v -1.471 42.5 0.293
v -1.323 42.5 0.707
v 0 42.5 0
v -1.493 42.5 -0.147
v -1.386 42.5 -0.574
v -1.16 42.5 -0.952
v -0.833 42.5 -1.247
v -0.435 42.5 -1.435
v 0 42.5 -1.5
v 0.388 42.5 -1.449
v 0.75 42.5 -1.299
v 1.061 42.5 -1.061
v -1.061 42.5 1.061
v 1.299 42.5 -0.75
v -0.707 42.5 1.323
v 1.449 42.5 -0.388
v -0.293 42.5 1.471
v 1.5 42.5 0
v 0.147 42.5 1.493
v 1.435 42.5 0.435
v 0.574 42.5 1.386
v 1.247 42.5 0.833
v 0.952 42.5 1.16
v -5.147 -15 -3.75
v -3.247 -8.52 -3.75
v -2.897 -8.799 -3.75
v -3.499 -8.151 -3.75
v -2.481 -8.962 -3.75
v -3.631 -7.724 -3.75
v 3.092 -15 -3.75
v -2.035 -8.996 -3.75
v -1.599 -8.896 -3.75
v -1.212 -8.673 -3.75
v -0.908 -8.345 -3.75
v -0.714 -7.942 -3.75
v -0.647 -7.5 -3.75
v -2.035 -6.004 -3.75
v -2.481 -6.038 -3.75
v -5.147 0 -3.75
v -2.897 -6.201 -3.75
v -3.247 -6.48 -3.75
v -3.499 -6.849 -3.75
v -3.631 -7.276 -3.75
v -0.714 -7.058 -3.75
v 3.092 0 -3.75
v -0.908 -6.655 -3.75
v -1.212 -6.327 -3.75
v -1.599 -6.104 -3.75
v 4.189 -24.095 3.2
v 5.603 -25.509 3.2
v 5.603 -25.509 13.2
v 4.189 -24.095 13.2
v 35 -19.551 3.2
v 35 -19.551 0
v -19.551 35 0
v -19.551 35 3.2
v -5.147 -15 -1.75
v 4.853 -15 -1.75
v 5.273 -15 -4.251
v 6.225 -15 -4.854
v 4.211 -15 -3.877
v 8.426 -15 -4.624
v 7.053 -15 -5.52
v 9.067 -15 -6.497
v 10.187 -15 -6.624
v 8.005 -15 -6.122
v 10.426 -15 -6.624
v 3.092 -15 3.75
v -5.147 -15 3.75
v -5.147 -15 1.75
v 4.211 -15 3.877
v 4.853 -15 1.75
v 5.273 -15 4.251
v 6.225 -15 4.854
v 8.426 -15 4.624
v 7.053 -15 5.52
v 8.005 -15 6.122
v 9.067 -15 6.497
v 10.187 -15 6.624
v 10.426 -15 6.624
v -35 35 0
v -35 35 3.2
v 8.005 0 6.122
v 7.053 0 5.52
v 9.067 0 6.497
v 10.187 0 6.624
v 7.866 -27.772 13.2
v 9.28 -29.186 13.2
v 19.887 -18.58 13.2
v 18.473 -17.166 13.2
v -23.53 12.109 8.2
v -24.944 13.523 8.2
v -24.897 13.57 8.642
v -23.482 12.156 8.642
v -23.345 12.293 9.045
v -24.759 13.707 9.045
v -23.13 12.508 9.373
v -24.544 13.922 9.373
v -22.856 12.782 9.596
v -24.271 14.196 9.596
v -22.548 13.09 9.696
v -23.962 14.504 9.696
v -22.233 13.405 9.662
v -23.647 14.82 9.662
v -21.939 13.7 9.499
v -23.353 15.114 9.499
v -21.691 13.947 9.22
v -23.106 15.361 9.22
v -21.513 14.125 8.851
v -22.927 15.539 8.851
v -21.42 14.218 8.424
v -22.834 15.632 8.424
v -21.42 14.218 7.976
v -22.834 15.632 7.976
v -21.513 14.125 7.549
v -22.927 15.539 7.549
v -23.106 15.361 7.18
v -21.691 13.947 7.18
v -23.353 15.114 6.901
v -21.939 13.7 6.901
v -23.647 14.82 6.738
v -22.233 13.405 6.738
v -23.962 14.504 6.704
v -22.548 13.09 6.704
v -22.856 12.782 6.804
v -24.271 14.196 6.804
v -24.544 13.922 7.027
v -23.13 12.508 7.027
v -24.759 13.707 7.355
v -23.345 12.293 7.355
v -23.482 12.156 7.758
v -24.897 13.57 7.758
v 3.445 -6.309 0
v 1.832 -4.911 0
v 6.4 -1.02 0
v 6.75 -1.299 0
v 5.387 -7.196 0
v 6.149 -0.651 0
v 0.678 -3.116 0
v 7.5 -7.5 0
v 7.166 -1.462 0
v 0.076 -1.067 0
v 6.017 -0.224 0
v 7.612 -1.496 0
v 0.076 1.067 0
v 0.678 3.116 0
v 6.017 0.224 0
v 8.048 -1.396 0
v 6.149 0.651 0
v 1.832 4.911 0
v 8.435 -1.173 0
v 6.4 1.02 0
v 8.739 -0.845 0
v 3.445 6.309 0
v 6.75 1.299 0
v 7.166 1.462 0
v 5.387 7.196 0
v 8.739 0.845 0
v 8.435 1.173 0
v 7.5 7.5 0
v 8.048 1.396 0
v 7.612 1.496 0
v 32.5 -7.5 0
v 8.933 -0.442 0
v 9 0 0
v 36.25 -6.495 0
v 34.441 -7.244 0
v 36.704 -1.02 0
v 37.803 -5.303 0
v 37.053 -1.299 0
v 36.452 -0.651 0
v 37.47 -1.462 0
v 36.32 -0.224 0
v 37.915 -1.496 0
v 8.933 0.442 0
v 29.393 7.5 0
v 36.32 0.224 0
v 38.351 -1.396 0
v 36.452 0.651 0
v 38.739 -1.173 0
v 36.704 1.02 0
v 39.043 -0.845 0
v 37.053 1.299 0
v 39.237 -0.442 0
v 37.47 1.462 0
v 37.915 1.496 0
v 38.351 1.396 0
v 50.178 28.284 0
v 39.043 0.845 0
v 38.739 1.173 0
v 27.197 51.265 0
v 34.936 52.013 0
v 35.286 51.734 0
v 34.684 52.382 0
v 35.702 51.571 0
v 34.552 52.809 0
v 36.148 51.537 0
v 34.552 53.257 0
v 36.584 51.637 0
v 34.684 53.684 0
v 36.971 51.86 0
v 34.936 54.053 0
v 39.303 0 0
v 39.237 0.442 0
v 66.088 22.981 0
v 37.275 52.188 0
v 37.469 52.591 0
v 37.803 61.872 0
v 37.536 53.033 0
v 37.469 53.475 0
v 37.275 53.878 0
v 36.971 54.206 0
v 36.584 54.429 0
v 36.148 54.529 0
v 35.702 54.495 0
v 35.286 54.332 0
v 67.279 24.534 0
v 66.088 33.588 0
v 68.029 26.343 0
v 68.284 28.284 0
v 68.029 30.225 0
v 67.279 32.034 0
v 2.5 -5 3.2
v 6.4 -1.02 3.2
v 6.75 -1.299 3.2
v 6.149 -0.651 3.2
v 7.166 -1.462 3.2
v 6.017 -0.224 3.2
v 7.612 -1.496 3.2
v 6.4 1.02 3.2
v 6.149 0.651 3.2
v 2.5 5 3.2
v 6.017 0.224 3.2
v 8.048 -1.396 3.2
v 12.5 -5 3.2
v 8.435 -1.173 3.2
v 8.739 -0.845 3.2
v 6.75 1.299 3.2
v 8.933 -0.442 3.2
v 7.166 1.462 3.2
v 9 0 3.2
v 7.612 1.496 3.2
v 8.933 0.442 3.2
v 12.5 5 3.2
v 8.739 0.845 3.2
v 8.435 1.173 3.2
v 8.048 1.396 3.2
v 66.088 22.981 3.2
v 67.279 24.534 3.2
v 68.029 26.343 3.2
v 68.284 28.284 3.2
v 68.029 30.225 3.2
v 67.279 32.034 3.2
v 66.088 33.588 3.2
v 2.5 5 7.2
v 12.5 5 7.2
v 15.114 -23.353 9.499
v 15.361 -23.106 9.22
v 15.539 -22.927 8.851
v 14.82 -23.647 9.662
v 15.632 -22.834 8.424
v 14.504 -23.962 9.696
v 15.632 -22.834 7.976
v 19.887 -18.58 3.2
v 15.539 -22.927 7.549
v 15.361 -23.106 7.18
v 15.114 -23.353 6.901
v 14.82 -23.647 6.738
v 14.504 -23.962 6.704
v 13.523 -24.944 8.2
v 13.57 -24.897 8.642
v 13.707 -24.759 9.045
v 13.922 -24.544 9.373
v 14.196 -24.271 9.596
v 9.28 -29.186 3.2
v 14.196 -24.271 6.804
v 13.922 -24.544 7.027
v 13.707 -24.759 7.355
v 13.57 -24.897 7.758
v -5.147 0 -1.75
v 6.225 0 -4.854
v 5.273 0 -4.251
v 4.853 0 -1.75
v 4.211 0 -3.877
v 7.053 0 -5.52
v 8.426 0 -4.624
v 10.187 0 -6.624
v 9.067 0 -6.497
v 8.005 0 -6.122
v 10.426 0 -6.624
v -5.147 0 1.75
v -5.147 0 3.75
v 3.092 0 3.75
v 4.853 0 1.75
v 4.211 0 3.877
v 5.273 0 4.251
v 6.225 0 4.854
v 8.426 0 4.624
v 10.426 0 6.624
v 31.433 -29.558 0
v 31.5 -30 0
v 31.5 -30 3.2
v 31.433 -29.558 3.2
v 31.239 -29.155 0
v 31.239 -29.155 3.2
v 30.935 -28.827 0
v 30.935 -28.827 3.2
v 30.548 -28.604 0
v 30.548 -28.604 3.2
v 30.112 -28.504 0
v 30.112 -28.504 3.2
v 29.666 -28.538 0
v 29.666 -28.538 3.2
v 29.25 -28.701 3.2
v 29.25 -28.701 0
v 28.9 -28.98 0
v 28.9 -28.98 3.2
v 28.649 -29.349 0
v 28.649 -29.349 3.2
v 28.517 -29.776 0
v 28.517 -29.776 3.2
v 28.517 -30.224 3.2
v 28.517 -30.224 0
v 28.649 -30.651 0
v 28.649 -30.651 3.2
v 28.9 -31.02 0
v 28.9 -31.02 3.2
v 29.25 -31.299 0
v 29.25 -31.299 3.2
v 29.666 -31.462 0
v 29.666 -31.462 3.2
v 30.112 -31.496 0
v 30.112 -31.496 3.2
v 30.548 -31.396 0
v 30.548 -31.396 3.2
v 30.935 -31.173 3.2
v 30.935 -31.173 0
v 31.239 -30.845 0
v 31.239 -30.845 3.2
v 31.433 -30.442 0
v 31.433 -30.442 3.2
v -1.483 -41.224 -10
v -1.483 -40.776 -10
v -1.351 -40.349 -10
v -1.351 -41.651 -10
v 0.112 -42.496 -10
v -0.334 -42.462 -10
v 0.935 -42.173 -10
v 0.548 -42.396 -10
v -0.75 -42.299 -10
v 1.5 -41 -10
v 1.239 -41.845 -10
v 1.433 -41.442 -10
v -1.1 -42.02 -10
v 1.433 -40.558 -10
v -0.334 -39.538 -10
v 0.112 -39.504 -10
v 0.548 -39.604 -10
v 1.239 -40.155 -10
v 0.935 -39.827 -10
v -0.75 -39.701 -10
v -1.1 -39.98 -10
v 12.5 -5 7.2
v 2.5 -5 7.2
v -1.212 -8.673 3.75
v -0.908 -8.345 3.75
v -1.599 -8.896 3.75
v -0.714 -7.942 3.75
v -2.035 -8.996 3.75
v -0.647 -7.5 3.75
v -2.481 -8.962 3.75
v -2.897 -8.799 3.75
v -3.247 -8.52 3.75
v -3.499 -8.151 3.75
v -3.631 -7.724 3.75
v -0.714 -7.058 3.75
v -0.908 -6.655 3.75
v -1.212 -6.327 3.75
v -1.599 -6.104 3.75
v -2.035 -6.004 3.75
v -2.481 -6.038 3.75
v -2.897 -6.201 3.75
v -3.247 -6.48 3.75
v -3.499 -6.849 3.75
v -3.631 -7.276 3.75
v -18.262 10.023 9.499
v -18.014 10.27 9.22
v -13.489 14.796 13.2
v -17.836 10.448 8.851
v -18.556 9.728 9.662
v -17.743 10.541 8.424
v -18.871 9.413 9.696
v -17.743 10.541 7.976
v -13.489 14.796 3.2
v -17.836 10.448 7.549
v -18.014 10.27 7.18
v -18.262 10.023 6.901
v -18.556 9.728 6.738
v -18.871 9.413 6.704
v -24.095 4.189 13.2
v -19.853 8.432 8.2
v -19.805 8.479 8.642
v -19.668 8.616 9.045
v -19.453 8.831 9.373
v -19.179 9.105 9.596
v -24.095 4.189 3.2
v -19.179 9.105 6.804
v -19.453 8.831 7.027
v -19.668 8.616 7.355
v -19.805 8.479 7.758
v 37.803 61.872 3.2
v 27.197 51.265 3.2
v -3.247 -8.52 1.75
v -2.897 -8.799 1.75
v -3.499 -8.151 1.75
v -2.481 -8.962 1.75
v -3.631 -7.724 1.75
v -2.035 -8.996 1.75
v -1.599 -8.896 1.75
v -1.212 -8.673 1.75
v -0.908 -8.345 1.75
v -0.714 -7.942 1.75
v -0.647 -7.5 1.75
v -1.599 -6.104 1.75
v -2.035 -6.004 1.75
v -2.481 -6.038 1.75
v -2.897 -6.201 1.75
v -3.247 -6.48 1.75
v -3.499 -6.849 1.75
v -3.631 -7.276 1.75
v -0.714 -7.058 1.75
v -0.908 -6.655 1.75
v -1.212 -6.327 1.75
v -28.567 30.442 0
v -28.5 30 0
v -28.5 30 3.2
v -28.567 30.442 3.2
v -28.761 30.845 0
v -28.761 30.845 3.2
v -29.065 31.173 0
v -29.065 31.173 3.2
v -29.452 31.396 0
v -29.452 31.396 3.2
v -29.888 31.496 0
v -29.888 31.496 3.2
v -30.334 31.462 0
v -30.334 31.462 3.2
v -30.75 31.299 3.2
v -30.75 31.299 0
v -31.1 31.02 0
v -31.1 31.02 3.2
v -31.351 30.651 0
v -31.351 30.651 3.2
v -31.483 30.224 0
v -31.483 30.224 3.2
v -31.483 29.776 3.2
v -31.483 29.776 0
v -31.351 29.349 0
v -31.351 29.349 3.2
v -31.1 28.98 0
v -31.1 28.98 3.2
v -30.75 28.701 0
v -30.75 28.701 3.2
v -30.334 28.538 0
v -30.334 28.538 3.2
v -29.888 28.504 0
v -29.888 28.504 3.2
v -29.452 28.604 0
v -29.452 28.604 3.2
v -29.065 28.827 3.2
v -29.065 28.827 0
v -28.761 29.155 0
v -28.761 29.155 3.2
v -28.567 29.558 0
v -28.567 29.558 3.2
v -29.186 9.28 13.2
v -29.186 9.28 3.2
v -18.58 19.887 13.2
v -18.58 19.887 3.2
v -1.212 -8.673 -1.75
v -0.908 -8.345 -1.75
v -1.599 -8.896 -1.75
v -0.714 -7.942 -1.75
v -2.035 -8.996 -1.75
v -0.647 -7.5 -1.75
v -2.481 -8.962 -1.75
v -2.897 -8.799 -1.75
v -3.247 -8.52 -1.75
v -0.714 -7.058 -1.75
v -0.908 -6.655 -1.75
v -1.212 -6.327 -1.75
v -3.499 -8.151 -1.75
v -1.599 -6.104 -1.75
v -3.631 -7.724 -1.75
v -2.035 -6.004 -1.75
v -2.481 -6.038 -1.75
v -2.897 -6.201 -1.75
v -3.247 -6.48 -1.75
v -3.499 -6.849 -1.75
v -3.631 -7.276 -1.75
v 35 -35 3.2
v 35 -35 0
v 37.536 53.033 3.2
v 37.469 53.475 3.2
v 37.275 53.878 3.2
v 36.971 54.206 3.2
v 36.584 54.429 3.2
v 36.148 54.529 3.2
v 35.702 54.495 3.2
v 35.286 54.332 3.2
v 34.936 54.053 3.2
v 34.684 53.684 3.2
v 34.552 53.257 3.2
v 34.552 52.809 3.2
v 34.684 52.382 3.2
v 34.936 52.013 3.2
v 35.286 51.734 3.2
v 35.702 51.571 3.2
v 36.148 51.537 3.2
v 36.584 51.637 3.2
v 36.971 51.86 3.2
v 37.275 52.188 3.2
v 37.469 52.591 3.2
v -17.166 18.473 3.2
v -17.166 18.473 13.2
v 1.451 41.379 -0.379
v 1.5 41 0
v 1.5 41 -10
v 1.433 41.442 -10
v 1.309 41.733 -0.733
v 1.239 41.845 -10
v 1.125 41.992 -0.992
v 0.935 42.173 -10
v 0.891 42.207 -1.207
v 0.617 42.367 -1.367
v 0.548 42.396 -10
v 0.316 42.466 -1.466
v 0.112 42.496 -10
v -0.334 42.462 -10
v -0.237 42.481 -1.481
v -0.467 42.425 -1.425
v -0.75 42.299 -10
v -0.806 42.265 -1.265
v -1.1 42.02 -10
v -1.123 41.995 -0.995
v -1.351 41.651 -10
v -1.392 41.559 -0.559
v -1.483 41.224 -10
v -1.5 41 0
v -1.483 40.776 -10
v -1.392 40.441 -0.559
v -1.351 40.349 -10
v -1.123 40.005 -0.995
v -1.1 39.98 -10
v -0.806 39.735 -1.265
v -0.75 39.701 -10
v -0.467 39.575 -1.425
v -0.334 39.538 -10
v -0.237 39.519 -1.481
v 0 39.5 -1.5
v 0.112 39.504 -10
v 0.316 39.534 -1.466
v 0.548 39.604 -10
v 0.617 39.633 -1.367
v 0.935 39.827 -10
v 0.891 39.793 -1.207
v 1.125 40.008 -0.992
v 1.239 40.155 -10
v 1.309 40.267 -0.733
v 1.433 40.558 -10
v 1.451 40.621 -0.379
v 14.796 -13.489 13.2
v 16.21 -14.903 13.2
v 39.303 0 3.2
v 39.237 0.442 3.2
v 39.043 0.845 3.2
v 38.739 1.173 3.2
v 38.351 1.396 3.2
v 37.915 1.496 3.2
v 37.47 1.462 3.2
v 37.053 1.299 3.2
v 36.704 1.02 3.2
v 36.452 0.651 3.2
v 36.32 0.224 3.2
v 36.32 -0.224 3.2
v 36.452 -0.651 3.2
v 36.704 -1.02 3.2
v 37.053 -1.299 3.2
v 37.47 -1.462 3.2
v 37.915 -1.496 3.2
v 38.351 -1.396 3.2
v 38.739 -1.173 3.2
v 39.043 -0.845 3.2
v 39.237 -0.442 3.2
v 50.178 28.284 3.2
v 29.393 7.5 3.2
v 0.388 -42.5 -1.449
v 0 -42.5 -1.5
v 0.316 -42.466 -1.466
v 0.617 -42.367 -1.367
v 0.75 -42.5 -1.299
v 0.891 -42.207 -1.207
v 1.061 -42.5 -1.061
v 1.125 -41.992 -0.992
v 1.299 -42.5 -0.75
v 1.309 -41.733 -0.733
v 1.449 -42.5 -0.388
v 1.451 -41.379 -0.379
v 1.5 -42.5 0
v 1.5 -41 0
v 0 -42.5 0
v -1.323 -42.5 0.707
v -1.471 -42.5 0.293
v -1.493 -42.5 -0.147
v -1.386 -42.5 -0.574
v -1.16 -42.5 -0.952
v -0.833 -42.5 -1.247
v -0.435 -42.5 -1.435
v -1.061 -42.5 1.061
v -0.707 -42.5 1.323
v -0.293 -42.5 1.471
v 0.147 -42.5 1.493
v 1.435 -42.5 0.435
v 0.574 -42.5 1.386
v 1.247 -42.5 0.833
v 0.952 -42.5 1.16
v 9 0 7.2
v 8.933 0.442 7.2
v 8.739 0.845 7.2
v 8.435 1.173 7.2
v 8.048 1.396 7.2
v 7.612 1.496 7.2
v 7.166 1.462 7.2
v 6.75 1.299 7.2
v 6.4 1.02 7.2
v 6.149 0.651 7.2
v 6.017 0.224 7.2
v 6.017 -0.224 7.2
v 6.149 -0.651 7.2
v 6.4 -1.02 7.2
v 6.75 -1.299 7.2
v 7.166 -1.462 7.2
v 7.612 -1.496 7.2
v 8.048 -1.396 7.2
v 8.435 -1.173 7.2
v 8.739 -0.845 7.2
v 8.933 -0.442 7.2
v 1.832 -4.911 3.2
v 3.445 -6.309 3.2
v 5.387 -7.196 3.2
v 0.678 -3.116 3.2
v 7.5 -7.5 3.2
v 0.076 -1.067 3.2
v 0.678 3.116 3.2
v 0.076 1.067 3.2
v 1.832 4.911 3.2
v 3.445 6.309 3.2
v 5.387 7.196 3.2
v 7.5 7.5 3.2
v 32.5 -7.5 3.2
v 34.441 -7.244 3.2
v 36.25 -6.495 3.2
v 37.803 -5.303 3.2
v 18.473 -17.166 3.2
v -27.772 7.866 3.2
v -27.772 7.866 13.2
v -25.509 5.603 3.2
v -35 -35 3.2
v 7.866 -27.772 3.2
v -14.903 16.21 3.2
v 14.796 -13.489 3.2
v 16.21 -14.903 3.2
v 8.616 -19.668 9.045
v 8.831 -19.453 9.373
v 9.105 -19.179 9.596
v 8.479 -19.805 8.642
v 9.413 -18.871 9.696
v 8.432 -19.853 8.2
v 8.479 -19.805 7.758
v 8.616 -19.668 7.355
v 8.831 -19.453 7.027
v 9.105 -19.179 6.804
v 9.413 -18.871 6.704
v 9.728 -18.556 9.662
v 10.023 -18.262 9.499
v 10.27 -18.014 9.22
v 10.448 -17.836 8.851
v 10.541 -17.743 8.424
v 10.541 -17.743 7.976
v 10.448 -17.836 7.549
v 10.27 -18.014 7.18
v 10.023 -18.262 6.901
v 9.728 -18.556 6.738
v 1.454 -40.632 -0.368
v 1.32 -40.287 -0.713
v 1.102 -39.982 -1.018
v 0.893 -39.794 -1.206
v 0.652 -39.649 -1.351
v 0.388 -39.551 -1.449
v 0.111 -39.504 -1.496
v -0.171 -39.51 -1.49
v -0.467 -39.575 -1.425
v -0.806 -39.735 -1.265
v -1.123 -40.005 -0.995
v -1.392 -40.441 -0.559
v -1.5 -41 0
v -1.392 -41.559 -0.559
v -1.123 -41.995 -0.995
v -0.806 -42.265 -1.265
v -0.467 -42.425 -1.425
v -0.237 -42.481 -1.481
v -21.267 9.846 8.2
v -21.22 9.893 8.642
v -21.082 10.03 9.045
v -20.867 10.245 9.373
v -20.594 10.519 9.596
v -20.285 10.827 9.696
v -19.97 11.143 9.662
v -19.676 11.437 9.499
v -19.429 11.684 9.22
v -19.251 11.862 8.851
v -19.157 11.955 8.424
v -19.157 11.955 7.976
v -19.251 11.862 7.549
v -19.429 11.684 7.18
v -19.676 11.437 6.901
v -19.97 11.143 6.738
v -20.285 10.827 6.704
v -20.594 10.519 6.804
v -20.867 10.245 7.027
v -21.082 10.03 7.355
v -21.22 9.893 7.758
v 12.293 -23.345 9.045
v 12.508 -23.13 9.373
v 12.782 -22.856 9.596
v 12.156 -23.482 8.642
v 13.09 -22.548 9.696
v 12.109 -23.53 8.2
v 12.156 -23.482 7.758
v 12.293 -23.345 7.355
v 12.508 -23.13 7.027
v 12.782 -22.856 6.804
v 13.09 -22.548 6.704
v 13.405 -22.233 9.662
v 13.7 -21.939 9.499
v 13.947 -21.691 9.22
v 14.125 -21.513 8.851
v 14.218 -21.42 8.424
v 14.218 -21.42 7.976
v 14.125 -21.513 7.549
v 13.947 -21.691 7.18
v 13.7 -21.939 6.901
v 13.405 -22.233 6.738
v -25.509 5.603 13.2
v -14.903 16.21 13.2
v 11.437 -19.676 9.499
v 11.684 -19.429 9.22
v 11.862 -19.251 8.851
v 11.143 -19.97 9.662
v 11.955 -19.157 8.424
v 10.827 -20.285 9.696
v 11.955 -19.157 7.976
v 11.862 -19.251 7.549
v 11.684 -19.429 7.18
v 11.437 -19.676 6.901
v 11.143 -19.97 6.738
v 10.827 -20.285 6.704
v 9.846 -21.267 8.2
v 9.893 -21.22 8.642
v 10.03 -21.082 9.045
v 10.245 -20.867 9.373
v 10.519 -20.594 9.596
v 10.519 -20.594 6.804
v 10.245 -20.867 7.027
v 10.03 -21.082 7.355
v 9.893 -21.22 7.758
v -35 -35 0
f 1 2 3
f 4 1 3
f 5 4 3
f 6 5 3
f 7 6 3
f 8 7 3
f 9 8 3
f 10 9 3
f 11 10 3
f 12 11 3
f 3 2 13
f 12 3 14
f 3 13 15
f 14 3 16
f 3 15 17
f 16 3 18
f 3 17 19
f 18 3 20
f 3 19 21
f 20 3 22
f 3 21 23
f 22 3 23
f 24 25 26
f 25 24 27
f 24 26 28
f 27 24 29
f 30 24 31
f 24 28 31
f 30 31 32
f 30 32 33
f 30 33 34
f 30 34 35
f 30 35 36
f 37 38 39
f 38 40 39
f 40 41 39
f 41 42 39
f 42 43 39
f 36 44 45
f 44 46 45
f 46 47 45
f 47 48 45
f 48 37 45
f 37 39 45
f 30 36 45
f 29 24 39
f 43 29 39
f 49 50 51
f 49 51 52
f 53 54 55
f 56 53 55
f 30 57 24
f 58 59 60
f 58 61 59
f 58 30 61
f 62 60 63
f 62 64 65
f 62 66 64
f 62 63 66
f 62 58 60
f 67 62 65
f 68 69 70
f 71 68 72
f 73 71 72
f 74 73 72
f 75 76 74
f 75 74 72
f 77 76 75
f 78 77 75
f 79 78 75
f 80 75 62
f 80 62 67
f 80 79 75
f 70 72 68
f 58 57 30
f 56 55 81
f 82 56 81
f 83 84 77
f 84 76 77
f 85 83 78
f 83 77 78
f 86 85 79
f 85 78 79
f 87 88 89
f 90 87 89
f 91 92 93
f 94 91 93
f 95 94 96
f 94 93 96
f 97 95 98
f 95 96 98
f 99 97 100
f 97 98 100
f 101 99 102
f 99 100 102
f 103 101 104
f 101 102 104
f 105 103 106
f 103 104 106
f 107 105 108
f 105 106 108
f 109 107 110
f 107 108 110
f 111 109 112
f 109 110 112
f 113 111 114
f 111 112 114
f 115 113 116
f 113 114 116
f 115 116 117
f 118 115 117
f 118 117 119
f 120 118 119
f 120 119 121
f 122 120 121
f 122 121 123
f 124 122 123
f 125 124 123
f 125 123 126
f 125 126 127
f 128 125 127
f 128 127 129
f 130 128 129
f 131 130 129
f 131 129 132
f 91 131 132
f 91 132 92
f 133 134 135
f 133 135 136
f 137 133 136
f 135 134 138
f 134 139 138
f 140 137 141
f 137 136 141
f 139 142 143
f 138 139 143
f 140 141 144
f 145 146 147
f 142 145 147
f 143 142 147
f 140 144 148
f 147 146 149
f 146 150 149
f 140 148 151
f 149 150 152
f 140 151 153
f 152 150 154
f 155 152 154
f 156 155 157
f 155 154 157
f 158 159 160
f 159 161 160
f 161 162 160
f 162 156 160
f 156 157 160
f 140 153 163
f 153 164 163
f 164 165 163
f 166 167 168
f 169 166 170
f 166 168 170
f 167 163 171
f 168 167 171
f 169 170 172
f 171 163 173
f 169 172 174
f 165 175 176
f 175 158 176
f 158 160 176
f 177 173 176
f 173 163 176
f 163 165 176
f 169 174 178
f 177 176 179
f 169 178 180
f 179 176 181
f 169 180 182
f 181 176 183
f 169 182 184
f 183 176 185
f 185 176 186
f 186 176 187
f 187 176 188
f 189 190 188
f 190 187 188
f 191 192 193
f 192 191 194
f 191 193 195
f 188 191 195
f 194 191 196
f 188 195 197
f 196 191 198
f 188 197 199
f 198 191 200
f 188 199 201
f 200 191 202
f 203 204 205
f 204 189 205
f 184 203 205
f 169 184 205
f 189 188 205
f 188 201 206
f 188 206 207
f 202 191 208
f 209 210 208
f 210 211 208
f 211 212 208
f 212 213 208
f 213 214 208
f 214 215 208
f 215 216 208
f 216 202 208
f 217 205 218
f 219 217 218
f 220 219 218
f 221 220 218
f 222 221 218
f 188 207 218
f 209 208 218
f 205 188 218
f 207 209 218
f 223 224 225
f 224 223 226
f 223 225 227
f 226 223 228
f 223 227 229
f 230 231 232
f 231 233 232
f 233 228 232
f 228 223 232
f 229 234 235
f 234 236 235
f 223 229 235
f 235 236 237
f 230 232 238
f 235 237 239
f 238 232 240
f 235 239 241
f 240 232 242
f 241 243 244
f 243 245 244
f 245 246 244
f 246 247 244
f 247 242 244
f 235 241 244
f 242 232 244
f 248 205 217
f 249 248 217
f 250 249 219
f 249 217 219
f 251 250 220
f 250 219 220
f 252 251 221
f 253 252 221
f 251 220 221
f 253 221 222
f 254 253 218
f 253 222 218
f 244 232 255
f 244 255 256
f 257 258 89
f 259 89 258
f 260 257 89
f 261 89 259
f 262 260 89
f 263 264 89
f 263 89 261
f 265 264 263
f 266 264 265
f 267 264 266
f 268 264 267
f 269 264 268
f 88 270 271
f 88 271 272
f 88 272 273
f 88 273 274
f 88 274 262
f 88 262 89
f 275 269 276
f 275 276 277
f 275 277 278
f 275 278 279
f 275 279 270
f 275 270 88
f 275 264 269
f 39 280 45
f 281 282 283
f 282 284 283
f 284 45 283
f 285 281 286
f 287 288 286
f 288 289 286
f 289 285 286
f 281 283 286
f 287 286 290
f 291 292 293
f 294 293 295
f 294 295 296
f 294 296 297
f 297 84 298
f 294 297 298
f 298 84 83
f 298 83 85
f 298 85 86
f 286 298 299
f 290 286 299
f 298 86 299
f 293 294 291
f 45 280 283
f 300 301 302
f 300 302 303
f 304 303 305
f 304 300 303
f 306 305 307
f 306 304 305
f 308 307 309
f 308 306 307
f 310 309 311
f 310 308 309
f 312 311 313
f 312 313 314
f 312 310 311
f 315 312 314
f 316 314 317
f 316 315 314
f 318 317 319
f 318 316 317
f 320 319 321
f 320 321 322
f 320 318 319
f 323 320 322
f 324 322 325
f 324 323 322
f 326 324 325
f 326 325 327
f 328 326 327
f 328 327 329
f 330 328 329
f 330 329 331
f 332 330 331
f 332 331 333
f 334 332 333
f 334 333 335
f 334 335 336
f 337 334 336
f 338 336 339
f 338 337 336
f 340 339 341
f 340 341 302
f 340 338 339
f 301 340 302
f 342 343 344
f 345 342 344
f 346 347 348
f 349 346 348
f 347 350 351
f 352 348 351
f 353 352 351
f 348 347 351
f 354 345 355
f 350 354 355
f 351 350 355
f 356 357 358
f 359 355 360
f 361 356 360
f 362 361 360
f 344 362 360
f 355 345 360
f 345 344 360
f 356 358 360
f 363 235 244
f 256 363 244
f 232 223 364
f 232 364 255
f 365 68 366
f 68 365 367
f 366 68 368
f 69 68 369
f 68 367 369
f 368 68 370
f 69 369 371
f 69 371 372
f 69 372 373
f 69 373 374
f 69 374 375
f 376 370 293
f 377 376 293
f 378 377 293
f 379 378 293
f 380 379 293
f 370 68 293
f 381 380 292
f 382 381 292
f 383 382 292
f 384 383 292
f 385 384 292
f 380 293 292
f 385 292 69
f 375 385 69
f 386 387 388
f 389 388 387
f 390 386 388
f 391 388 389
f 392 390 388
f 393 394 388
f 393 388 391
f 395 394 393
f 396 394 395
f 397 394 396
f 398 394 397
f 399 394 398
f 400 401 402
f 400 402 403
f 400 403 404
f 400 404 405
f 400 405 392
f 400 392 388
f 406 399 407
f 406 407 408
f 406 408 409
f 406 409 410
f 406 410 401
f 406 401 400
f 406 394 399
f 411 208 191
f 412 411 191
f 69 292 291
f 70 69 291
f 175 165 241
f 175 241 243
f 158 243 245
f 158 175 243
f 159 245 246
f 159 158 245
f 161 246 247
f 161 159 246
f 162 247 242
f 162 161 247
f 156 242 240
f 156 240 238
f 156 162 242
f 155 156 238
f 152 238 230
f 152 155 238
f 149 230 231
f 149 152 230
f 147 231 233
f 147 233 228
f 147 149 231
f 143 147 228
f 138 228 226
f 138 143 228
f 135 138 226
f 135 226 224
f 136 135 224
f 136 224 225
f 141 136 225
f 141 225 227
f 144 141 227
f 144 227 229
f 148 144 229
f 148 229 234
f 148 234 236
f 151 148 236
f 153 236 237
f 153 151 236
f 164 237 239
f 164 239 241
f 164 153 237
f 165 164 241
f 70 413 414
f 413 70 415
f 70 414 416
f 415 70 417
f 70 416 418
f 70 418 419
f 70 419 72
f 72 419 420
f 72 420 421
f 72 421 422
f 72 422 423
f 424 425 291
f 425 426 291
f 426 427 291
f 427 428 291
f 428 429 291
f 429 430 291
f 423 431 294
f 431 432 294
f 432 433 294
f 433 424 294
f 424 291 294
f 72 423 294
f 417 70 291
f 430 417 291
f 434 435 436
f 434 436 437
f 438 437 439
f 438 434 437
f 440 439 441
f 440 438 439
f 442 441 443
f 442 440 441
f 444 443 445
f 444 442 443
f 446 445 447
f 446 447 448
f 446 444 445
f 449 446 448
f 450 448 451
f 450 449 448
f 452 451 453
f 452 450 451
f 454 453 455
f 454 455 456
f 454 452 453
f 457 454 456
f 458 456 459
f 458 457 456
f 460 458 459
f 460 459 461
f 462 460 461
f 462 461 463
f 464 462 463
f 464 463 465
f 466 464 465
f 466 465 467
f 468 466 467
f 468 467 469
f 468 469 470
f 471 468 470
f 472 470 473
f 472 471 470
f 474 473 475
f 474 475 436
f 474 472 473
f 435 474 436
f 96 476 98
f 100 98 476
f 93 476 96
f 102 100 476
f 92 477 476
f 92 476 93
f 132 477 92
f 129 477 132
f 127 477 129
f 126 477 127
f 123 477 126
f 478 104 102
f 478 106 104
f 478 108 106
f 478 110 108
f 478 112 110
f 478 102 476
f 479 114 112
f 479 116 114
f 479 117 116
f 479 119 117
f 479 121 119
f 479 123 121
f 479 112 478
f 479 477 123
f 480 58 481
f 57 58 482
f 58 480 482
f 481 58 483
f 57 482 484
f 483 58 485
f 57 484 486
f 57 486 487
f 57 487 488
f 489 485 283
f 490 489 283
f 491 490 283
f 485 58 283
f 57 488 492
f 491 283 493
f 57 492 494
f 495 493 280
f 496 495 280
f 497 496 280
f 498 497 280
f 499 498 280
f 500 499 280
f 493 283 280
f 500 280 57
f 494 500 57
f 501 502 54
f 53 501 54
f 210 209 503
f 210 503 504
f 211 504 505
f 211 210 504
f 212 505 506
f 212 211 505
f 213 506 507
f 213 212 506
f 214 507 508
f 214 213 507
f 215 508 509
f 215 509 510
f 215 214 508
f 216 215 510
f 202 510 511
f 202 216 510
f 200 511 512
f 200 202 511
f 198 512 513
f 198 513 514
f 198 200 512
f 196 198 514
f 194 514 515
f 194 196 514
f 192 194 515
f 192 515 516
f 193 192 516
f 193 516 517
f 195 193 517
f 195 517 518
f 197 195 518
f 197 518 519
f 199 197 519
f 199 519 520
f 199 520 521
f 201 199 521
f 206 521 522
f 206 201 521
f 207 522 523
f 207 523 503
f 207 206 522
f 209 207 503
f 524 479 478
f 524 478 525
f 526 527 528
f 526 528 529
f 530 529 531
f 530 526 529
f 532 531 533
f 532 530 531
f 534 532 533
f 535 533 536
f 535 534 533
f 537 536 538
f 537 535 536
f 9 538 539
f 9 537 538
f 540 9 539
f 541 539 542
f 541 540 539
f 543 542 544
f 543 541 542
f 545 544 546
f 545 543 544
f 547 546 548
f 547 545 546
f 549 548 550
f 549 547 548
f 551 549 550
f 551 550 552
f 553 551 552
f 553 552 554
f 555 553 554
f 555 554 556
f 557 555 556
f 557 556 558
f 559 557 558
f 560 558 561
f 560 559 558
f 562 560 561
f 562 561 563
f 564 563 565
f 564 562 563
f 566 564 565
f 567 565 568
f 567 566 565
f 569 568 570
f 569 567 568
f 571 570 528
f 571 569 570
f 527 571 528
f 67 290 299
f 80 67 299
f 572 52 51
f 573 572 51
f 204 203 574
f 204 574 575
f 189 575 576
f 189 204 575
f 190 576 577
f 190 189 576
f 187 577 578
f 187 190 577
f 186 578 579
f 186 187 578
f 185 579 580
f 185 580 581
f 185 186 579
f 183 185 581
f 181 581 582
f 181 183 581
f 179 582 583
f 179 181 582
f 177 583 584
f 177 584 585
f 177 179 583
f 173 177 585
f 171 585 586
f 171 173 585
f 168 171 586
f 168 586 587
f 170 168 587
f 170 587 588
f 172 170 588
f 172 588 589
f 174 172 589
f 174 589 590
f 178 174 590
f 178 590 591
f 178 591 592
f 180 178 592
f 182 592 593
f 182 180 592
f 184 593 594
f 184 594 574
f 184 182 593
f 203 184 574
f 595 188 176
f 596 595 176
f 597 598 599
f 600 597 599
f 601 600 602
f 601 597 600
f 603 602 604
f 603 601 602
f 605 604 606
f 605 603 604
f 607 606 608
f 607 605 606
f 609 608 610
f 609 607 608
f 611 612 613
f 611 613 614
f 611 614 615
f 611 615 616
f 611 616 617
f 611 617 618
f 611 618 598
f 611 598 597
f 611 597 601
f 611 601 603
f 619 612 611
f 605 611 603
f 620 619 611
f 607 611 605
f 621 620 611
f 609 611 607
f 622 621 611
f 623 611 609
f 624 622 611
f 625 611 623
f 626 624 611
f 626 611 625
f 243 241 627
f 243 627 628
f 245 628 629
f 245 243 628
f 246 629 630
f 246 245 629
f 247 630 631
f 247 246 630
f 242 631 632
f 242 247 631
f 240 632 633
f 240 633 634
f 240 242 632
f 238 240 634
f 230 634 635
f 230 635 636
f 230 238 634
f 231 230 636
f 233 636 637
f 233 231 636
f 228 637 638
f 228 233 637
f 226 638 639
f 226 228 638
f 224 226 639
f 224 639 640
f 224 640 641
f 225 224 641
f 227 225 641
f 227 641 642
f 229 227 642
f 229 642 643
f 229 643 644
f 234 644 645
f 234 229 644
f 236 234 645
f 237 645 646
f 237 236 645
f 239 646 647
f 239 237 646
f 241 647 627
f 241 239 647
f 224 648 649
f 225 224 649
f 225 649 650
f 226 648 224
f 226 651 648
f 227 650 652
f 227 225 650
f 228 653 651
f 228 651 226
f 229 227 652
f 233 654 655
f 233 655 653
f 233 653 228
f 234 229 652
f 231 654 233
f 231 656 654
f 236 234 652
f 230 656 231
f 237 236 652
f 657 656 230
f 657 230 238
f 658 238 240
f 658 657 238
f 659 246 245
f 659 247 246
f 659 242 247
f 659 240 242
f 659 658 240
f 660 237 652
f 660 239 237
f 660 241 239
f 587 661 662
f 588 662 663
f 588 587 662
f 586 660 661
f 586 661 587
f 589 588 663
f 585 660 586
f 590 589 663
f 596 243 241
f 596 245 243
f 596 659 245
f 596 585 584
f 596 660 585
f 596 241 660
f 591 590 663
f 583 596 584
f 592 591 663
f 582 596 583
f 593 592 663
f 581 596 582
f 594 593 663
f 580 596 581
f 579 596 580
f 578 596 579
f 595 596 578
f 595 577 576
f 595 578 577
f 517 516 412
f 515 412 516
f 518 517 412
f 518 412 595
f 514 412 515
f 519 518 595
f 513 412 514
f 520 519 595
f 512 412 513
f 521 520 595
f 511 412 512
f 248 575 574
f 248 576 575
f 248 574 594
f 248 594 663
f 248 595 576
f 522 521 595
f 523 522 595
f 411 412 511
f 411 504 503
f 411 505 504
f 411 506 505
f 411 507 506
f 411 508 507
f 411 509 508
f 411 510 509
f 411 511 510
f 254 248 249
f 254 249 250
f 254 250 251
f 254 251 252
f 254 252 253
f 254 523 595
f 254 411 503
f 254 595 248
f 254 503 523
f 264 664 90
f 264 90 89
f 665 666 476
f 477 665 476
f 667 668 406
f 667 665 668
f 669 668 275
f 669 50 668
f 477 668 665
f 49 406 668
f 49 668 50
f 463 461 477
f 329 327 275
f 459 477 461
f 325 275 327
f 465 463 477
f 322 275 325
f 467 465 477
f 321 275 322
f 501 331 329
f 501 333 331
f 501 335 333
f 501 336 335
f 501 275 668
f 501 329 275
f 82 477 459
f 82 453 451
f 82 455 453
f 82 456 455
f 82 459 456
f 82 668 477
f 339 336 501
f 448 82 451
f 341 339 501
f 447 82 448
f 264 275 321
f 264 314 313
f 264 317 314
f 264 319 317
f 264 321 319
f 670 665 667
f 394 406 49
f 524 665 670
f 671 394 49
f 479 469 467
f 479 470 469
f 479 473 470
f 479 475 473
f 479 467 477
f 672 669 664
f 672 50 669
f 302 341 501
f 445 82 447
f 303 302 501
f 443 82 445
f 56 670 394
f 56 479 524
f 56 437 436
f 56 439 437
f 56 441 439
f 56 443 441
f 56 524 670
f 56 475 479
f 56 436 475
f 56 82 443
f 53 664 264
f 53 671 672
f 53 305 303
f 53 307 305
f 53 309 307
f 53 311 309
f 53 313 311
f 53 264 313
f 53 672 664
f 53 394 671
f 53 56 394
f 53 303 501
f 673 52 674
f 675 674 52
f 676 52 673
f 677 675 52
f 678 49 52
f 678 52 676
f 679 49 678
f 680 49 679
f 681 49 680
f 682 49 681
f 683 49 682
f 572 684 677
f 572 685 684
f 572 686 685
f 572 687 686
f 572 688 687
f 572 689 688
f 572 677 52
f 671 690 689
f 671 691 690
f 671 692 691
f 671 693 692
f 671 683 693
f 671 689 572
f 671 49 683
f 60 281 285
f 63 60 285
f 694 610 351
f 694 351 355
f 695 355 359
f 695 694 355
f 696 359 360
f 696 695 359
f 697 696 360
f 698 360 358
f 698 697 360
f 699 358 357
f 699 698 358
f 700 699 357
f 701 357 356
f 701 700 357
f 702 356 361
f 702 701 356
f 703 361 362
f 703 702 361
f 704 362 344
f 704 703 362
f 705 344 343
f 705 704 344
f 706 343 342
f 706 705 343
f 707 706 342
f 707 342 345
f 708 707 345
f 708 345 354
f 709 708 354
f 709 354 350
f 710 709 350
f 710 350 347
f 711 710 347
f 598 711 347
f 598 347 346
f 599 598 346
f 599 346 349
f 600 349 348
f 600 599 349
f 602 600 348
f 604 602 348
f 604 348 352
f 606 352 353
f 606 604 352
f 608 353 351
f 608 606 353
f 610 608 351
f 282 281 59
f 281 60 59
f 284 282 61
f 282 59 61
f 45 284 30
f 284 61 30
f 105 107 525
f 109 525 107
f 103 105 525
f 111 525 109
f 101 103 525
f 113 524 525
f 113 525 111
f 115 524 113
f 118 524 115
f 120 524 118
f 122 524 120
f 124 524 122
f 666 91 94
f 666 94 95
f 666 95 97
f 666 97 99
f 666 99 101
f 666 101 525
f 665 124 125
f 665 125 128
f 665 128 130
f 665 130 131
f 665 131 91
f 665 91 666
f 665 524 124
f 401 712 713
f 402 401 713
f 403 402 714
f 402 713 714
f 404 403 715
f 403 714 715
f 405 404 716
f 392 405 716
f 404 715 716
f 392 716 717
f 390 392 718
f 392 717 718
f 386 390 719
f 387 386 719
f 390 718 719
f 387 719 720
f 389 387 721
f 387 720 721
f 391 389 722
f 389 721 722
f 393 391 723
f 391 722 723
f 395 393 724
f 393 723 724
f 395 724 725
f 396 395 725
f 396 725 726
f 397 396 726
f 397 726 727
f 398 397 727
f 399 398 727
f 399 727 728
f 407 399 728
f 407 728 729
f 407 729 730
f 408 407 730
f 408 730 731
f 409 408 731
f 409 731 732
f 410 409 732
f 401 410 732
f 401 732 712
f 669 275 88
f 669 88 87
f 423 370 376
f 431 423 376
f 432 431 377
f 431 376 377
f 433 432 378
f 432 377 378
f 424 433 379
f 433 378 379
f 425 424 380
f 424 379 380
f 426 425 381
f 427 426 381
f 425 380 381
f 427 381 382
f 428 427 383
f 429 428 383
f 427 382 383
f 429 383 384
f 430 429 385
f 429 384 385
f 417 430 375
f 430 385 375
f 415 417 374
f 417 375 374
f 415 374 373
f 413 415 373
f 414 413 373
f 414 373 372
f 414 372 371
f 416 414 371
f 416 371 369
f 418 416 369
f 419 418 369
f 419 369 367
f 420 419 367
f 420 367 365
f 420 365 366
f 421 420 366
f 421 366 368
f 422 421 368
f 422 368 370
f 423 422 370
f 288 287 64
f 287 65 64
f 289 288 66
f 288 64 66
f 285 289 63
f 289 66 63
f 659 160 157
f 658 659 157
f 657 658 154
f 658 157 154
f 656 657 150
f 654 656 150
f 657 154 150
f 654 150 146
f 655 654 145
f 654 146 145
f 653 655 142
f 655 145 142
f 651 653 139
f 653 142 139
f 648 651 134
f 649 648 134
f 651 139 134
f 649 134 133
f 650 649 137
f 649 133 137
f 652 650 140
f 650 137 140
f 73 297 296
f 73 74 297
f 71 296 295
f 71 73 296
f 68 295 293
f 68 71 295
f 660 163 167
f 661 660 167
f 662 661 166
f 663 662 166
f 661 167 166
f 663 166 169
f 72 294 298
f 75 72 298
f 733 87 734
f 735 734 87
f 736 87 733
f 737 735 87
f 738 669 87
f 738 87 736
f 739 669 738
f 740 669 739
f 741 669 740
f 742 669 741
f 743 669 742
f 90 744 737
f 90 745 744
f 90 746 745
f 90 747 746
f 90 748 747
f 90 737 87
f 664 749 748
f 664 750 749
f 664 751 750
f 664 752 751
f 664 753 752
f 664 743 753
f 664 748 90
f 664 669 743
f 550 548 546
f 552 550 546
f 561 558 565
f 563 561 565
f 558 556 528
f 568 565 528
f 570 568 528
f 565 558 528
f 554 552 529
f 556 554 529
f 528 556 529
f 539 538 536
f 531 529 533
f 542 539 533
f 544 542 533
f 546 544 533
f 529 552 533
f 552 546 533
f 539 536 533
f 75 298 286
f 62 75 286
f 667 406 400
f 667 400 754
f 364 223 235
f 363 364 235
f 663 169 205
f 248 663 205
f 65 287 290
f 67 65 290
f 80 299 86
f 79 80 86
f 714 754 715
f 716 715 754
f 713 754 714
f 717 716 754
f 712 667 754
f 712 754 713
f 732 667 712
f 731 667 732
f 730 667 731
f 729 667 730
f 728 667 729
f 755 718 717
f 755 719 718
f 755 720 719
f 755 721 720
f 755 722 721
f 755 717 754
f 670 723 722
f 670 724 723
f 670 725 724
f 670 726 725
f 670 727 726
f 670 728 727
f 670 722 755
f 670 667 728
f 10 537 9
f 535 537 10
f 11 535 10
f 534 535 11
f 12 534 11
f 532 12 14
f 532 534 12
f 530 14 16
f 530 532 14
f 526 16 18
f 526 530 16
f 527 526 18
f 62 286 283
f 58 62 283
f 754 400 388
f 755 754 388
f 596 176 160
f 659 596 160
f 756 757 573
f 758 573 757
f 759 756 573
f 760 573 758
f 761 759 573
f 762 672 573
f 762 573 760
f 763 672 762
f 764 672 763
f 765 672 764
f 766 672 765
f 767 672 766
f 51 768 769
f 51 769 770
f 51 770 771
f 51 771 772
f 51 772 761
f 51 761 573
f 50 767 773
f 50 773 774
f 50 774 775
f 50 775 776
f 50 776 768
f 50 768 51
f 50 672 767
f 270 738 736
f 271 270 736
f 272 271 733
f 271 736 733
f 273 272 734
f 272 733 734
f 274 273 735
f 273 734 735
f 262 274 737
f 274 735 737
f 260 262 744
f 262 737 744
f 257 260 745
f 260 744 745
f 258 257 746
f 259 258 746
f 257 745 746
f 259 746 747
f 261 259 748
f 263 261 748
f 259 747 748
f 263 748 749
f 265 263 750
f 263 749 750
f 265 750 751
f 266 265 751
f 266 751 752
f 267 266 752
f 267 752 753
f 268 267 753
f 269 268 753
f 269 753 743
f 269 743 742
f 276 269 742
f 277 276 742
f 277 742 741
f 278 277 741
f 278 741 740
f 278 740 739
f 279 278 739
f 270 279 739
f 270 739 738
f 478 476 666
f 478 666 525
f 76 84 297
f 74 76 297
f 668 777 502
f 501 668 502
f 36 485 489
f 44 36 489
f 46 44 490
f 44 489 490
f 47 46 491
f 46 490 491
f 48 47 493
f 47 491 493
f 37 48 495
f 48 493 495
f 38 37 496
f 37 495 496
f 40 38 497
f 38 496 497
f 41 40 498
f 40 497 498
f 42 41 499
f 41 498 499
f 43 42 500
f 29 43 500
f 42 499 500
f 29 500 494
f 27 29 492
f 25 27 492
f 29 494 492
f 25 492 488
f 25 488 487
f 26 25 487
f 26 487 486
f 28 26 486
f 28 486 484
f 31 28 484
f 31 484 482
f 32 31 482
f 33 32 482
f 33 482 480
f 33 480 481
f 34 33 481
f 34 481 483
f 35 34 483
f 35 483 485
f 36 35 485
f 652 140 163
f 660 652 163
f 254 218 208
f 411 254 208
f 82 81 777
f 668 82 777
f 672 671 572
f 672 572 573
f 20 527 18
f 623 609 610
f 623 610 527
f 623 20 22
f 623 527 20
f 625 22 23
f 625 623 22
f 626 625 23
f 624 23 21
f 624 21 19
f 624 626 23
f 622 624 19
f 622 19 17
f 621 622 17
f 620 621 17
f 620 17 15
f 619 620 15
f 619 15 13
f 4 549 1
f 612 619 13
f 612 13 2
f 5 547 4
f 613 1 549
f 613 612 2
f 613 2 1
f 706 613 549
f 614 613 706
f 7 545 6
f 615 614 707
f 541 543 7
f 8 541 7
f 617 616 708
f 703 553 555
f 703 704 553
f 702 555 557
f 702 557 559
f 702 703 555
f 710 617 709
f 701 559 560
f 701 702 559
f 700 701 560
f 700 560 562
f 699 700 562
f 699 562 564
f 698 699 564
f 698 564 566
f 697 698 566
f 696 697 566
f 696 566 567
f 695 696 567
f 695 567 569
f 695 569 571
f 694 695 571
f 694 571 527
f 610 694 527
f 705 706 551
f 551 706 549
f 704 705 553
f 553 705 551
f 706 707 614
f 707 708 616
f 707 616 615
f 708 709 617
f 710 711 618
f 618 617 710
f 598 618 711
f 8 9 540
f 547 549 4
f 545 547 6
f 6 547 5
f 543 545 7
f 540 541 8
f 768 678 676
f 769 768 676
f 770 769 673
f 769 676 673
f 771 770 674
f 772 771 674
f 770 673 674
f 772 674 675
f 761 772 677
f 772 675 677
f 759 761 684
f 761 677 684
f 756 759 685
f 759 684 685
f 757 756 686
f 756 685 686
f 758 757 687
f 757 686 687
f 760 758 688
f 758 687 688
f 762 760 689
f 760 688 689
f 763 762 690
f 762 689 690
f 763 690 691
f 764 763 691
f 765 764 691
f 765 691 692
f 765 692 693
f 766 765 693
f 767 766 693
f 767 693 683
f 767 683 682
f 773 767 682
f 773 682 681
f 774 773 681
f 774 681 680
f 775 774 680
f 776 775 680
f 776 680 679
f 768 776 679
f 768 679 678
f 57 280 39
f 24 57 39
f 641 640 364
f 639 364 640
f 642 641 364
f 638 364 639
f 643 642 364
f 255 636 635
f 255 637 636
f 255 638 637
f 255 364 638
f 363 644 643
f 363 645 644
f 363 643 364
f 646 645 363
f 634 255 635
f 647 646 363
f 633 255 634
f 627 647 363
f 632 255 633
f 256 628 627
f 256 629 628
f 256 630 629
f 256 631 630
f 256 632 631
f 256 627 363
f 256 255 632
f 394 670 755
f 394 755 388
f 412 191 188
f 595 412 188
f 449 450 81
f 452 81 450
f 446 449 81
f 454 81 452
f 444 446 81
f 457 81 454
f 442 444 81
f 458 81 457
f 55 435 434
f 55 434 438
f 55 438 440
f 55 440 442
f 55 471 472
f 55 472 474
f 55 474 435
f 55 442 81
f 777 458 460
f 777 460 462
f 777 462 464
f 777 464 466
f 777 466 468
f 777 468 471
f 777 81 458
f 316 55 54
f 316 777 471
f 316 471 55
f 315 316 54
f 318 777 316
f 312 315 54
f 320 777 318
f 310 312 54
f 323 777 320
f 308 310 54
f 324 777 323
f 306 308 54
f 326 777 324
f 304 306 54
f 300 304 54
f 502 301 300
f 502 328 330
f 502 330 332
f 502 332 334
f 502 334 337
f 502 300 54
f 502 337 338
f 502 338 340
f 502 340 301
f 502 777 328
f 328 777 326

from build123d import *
from build123d import SkipClean  # not in build123d's __all__

# Parameters (mm, degrees)
F0_R      = 1.5
F1_DEPTH  = 3.2
F2_R      = 1.5
F3_DEPTH  = 3.2
F5_DEPTH  = 15
F6_R      = 1.5
F7_DEPTH  = 25
F8_R      = 5
F9_R      = 5
F10_W     = 10
F10_H     = 10
F10_R     = 1.5
F11_DEPTH = 4
F13_DEPTH = 13.2
F14_R     = 1.5
F15_DEPTH = 60
F16_R     = 1.5
F17_DEPTH = 42.5
F18_R     = 1.5
F19_DEPTH = 10
F20_R     = 1.5
F21_DEPTH = 10


with BuildPart() as f1:
    # F0 (on Top) → F1 (new body)
    with BuildSketch(Plane.XY):
        with BuildLine():
            Line((29.3933982822, 7.5), (7.5, 7.5))
            ThreePointArc((7.5, 7.5), (0, 0), (7.5, -7.5))
            Line((7.5, -7.5), (32.5, -7.5))
            ThreePointArc((32.5, -7.5), (35.3701257427, -6.9290964938), (37.8033008589, -5.3033008589))
            ThreePointArc((37.8033008589, -5.3033008589), (39.4290964938, 2.8701257427), (32.5, 7.5))
            ThreePointArc((32.5, 7.5), (29.6298742573, 6.9290964938), (27.1966991411, 5.3033008589))
            Line((27.1966991411, 5.3033008589), (29.3933982822, 7.5))
        make_face()
        with Locations((7.5, 0)):
            Circle(F0_R, mode=Mode.SUBTRACT)
        with Locations((37.8033008589, 0)):
            Circle(F0_R, mode=Mode.SUBTRACT)
        with BuildLine():
            Line((50.1776695297, 28.2842712475), (29.3933982822, 7.5))
            Line((29.3933982822, 7.5), (32.5, 7.5))
            ThreePointArc((32.5, 7.5), (39.4290964938, 2.8701257427), (37.8033008589, -5.3033008589))
            Line((37.8033008589, -5.3033008589), (66.0875721064, 22.9809703886))
            ThreePointArc((66.0875721064, 22.9809703886), (60.7842712475, 20.7842712475), (55.4809703886, 22.9809703886))
            Line((55.4809703886, 22.9809703886), (50.1776695297, 28.2842712475))
        make_face()
        with BuildLine():
            Line((32.5, 7.5), (29.3933982822, 7.5))
            Line((29.3933982822, 7.5), (27.1966991411, 5.3033008589))
            ThreePointArc((27.1966991411, 5.3033008589), (29.6298742573, 6.9290964938), (32.5, 7.5))
        make_face()
        with BuildLine():
            Line((27.1966991411, 51.265241636), (50.1776695297, 28.2842712475))
            Line((50.1776695297, 28.2842712475), (55.4809703886, 33.5875721064))
            ThreePointArc((55.4809703886, 33.5875721064), (60.7842712475, 35.7842712475), (66.0875721064, 33.5875721064))
            Line((66.0875721064, 33.5875721064), (37.8033008589, 61.8718433538))
            Line((37.8033008589, 61.8718433538), (27.1966991411, 51.265241636))
        make_face()
        with Locations((36.0355339059, 53.033008589)):
            Circle(F0_R, mode=Mode.SUBTRACT)
        with BuildLine():
            Line((55.4809703886, 33.5875721064), (50.1776695297, 28.2842712475))
            Line((50.1776695297, 28.2842712475), (55.4809703886, 22.9809703886))
            ThreePointArc((55.4809703886, 22.9809703886), (60.7842712475, 20.7842712475), (66.0875721064, 22.9809703886))
            ThreePointArc((66.0875721064, 22.9809703886), (68.2842712475, 28.2842712475), (66.0875721064, 33.5875721064))
            ThreePointArc((66.0875721064, 33.5875721064), (60.7842712475, 35.7842712475), (55.4809703886, 33.5875721064))
        make_face()
    extrude(amount=F1_DEPTH)


with BuildPart() as f3:
    # F2 (on Top) → F3 (new body)
    with BuildSketch(Plane.XY):
        Polygon((-35, -35), (35, -35), (35, -19.5508284215), (-19.5508284215, 35), (-35, 35), align=None)
        with Locations((30, -30)):
            Circle(F2_R, mode=Mode.SUBTRACT)
        with Locations((-30, 30)):
            Circle(F2_R, mode=Mode.SUBTRACT)
    extrude(amount=F3_DEPTH)

    # F12 (on face) → F13 (join)
    with BuildSketch(Plane(origin=(0, 0, 0), x_dir=(1, 0, 0), z_dir=(0, 0, -1))):
        Polygon((-17.1655729085, -18.4726088633), (-27.7721746263, -7.8660071455), (-29.1863881887, -9.2802207079), (-18.5797864709, -19.8868224257), align=None)
        Polygon((-24.0952193641, -4.1890518833), (-25.5094329265, -5.6032654457), (-14.9028312087, -16.2098671635), (-13.4886176463, -14.7956536011), align=None)
        Polygon((4.1890518833, 24.0952193641), (14.7956536011, 13.4886176463), (16.2098671635, 14.9028312087), (5.6032654457, 25.5094329265), align=None)
        Polygon((9.2802207079, 29.1863881887), (7.8660071455, 27.7721746263), (18.4726088633, 17.1655729085), (19.8868224257, 18.5797864709), align=None)
    extrude(amount=-F13_DEPTH)

    # F14 (on face) → F15 (cut)
    with BuildSketch(Plane(origin=(-19.2333044483, 19.2333044483, 0), x_dir=(-0.7071067812, -0.7071067812, 0), z_dir=(-0.7071067812, 0.7071067812, 0))):
        with Locations((6.5757860131, 8.2)):
            Circle(F14_R)
    extrude(amount=-F15_DEPTH, mode=Mode.SUBTRACT)


with BuildPart() as f5:
    # F4 (on Front) → F5 (new body)
    with BuildSketch(Plane.XZ):
        Polygon((8.4256241946, 0), (8.4256241946, -4.6235096101), (4.852652266, -1.75), (-5.147347734, -1.75), (-5.147347734, -3.75), (4.852652266, -3.75), (8.4256241946, -6.6235096101), (10.4256241946, -6.6235096101), (10.4256241946, 0), (10.4256241946, 6.6235096101), (8.4256241946, 6.6235096101), (4.852652266, 3.75), (-5.147347734, 3.75), (-5.147347734, 1.75), (4.852652266, 1.75), (8.4256241946, 4.6235096101), align=None)
    extrude(amount=F5_DEPTH)

    # F6 (on face) → F7 (cut)
    with BuildSketch(Plane.XY.offset(3.75)):
        with Locations((-2.147347734, -7.5)):
            Circle(F6_R)
    extrude(amount=-F7_DEPTH, mode=Mode.SUBTRACT)

    # F8
    f8_edges = [f5.edges().sort_by_distance(p)[0] for p in [
        (4.852652, -7.5, 3.75),
    ]]
    fillet(f8_edges, radius=F8_R)

    # F9
    f9_edges = [f5.edges().sort_by_distance(p)[0] for p in [
        (4.852652, -7.5, -3.75),
        (8.425624, -7.5, -6.62351),
        (8.425624, -7.5, 6.62351),
    ]]
    fillet(f9_edges, radius=F9_R)


with BuildPart() as f11:
    # F10 (on face) → F11 (new body)
    with BuildSketch(Plane.XY.offset(3.2)):
        with Locations((7.5, 0)):
            Rectangle(F10_W, F10_H)
        with Locations((7.5, 0)):
            Circle(F10_R, mode=Mode.SUBTRACT)
    extrude(amount=F11_DEPTH)


with BuildPart() as f17:
    # F16 (on Front) → F17 (new body, symmetric)
    with BuildSketch(Plane.XZ):
        Circle(F16_R)
    extrude(amount=F17_DEPTH, both=True)

    # F18 (on Top) → F19 (join)
    with BuildSketch(Plane.XY):
        with Locations((0, -41)):
            Circle(F18_R)
    extrude(amount=-F19_DEPTH)

    # F20 (on Top) → F21 (join)
    with BuildSketch(Plane.XY):
        with Locations((0, 41)):
            Circle(F20_R)
    with SkipClean():  # cleaning this boolean's faces spoils the solid; the shape is the same uncleaned
        extrude(amount=-F21_DEPTH)


solid = Compound([f1.part, f3.part, f5.part, f11.part, f17.part])
